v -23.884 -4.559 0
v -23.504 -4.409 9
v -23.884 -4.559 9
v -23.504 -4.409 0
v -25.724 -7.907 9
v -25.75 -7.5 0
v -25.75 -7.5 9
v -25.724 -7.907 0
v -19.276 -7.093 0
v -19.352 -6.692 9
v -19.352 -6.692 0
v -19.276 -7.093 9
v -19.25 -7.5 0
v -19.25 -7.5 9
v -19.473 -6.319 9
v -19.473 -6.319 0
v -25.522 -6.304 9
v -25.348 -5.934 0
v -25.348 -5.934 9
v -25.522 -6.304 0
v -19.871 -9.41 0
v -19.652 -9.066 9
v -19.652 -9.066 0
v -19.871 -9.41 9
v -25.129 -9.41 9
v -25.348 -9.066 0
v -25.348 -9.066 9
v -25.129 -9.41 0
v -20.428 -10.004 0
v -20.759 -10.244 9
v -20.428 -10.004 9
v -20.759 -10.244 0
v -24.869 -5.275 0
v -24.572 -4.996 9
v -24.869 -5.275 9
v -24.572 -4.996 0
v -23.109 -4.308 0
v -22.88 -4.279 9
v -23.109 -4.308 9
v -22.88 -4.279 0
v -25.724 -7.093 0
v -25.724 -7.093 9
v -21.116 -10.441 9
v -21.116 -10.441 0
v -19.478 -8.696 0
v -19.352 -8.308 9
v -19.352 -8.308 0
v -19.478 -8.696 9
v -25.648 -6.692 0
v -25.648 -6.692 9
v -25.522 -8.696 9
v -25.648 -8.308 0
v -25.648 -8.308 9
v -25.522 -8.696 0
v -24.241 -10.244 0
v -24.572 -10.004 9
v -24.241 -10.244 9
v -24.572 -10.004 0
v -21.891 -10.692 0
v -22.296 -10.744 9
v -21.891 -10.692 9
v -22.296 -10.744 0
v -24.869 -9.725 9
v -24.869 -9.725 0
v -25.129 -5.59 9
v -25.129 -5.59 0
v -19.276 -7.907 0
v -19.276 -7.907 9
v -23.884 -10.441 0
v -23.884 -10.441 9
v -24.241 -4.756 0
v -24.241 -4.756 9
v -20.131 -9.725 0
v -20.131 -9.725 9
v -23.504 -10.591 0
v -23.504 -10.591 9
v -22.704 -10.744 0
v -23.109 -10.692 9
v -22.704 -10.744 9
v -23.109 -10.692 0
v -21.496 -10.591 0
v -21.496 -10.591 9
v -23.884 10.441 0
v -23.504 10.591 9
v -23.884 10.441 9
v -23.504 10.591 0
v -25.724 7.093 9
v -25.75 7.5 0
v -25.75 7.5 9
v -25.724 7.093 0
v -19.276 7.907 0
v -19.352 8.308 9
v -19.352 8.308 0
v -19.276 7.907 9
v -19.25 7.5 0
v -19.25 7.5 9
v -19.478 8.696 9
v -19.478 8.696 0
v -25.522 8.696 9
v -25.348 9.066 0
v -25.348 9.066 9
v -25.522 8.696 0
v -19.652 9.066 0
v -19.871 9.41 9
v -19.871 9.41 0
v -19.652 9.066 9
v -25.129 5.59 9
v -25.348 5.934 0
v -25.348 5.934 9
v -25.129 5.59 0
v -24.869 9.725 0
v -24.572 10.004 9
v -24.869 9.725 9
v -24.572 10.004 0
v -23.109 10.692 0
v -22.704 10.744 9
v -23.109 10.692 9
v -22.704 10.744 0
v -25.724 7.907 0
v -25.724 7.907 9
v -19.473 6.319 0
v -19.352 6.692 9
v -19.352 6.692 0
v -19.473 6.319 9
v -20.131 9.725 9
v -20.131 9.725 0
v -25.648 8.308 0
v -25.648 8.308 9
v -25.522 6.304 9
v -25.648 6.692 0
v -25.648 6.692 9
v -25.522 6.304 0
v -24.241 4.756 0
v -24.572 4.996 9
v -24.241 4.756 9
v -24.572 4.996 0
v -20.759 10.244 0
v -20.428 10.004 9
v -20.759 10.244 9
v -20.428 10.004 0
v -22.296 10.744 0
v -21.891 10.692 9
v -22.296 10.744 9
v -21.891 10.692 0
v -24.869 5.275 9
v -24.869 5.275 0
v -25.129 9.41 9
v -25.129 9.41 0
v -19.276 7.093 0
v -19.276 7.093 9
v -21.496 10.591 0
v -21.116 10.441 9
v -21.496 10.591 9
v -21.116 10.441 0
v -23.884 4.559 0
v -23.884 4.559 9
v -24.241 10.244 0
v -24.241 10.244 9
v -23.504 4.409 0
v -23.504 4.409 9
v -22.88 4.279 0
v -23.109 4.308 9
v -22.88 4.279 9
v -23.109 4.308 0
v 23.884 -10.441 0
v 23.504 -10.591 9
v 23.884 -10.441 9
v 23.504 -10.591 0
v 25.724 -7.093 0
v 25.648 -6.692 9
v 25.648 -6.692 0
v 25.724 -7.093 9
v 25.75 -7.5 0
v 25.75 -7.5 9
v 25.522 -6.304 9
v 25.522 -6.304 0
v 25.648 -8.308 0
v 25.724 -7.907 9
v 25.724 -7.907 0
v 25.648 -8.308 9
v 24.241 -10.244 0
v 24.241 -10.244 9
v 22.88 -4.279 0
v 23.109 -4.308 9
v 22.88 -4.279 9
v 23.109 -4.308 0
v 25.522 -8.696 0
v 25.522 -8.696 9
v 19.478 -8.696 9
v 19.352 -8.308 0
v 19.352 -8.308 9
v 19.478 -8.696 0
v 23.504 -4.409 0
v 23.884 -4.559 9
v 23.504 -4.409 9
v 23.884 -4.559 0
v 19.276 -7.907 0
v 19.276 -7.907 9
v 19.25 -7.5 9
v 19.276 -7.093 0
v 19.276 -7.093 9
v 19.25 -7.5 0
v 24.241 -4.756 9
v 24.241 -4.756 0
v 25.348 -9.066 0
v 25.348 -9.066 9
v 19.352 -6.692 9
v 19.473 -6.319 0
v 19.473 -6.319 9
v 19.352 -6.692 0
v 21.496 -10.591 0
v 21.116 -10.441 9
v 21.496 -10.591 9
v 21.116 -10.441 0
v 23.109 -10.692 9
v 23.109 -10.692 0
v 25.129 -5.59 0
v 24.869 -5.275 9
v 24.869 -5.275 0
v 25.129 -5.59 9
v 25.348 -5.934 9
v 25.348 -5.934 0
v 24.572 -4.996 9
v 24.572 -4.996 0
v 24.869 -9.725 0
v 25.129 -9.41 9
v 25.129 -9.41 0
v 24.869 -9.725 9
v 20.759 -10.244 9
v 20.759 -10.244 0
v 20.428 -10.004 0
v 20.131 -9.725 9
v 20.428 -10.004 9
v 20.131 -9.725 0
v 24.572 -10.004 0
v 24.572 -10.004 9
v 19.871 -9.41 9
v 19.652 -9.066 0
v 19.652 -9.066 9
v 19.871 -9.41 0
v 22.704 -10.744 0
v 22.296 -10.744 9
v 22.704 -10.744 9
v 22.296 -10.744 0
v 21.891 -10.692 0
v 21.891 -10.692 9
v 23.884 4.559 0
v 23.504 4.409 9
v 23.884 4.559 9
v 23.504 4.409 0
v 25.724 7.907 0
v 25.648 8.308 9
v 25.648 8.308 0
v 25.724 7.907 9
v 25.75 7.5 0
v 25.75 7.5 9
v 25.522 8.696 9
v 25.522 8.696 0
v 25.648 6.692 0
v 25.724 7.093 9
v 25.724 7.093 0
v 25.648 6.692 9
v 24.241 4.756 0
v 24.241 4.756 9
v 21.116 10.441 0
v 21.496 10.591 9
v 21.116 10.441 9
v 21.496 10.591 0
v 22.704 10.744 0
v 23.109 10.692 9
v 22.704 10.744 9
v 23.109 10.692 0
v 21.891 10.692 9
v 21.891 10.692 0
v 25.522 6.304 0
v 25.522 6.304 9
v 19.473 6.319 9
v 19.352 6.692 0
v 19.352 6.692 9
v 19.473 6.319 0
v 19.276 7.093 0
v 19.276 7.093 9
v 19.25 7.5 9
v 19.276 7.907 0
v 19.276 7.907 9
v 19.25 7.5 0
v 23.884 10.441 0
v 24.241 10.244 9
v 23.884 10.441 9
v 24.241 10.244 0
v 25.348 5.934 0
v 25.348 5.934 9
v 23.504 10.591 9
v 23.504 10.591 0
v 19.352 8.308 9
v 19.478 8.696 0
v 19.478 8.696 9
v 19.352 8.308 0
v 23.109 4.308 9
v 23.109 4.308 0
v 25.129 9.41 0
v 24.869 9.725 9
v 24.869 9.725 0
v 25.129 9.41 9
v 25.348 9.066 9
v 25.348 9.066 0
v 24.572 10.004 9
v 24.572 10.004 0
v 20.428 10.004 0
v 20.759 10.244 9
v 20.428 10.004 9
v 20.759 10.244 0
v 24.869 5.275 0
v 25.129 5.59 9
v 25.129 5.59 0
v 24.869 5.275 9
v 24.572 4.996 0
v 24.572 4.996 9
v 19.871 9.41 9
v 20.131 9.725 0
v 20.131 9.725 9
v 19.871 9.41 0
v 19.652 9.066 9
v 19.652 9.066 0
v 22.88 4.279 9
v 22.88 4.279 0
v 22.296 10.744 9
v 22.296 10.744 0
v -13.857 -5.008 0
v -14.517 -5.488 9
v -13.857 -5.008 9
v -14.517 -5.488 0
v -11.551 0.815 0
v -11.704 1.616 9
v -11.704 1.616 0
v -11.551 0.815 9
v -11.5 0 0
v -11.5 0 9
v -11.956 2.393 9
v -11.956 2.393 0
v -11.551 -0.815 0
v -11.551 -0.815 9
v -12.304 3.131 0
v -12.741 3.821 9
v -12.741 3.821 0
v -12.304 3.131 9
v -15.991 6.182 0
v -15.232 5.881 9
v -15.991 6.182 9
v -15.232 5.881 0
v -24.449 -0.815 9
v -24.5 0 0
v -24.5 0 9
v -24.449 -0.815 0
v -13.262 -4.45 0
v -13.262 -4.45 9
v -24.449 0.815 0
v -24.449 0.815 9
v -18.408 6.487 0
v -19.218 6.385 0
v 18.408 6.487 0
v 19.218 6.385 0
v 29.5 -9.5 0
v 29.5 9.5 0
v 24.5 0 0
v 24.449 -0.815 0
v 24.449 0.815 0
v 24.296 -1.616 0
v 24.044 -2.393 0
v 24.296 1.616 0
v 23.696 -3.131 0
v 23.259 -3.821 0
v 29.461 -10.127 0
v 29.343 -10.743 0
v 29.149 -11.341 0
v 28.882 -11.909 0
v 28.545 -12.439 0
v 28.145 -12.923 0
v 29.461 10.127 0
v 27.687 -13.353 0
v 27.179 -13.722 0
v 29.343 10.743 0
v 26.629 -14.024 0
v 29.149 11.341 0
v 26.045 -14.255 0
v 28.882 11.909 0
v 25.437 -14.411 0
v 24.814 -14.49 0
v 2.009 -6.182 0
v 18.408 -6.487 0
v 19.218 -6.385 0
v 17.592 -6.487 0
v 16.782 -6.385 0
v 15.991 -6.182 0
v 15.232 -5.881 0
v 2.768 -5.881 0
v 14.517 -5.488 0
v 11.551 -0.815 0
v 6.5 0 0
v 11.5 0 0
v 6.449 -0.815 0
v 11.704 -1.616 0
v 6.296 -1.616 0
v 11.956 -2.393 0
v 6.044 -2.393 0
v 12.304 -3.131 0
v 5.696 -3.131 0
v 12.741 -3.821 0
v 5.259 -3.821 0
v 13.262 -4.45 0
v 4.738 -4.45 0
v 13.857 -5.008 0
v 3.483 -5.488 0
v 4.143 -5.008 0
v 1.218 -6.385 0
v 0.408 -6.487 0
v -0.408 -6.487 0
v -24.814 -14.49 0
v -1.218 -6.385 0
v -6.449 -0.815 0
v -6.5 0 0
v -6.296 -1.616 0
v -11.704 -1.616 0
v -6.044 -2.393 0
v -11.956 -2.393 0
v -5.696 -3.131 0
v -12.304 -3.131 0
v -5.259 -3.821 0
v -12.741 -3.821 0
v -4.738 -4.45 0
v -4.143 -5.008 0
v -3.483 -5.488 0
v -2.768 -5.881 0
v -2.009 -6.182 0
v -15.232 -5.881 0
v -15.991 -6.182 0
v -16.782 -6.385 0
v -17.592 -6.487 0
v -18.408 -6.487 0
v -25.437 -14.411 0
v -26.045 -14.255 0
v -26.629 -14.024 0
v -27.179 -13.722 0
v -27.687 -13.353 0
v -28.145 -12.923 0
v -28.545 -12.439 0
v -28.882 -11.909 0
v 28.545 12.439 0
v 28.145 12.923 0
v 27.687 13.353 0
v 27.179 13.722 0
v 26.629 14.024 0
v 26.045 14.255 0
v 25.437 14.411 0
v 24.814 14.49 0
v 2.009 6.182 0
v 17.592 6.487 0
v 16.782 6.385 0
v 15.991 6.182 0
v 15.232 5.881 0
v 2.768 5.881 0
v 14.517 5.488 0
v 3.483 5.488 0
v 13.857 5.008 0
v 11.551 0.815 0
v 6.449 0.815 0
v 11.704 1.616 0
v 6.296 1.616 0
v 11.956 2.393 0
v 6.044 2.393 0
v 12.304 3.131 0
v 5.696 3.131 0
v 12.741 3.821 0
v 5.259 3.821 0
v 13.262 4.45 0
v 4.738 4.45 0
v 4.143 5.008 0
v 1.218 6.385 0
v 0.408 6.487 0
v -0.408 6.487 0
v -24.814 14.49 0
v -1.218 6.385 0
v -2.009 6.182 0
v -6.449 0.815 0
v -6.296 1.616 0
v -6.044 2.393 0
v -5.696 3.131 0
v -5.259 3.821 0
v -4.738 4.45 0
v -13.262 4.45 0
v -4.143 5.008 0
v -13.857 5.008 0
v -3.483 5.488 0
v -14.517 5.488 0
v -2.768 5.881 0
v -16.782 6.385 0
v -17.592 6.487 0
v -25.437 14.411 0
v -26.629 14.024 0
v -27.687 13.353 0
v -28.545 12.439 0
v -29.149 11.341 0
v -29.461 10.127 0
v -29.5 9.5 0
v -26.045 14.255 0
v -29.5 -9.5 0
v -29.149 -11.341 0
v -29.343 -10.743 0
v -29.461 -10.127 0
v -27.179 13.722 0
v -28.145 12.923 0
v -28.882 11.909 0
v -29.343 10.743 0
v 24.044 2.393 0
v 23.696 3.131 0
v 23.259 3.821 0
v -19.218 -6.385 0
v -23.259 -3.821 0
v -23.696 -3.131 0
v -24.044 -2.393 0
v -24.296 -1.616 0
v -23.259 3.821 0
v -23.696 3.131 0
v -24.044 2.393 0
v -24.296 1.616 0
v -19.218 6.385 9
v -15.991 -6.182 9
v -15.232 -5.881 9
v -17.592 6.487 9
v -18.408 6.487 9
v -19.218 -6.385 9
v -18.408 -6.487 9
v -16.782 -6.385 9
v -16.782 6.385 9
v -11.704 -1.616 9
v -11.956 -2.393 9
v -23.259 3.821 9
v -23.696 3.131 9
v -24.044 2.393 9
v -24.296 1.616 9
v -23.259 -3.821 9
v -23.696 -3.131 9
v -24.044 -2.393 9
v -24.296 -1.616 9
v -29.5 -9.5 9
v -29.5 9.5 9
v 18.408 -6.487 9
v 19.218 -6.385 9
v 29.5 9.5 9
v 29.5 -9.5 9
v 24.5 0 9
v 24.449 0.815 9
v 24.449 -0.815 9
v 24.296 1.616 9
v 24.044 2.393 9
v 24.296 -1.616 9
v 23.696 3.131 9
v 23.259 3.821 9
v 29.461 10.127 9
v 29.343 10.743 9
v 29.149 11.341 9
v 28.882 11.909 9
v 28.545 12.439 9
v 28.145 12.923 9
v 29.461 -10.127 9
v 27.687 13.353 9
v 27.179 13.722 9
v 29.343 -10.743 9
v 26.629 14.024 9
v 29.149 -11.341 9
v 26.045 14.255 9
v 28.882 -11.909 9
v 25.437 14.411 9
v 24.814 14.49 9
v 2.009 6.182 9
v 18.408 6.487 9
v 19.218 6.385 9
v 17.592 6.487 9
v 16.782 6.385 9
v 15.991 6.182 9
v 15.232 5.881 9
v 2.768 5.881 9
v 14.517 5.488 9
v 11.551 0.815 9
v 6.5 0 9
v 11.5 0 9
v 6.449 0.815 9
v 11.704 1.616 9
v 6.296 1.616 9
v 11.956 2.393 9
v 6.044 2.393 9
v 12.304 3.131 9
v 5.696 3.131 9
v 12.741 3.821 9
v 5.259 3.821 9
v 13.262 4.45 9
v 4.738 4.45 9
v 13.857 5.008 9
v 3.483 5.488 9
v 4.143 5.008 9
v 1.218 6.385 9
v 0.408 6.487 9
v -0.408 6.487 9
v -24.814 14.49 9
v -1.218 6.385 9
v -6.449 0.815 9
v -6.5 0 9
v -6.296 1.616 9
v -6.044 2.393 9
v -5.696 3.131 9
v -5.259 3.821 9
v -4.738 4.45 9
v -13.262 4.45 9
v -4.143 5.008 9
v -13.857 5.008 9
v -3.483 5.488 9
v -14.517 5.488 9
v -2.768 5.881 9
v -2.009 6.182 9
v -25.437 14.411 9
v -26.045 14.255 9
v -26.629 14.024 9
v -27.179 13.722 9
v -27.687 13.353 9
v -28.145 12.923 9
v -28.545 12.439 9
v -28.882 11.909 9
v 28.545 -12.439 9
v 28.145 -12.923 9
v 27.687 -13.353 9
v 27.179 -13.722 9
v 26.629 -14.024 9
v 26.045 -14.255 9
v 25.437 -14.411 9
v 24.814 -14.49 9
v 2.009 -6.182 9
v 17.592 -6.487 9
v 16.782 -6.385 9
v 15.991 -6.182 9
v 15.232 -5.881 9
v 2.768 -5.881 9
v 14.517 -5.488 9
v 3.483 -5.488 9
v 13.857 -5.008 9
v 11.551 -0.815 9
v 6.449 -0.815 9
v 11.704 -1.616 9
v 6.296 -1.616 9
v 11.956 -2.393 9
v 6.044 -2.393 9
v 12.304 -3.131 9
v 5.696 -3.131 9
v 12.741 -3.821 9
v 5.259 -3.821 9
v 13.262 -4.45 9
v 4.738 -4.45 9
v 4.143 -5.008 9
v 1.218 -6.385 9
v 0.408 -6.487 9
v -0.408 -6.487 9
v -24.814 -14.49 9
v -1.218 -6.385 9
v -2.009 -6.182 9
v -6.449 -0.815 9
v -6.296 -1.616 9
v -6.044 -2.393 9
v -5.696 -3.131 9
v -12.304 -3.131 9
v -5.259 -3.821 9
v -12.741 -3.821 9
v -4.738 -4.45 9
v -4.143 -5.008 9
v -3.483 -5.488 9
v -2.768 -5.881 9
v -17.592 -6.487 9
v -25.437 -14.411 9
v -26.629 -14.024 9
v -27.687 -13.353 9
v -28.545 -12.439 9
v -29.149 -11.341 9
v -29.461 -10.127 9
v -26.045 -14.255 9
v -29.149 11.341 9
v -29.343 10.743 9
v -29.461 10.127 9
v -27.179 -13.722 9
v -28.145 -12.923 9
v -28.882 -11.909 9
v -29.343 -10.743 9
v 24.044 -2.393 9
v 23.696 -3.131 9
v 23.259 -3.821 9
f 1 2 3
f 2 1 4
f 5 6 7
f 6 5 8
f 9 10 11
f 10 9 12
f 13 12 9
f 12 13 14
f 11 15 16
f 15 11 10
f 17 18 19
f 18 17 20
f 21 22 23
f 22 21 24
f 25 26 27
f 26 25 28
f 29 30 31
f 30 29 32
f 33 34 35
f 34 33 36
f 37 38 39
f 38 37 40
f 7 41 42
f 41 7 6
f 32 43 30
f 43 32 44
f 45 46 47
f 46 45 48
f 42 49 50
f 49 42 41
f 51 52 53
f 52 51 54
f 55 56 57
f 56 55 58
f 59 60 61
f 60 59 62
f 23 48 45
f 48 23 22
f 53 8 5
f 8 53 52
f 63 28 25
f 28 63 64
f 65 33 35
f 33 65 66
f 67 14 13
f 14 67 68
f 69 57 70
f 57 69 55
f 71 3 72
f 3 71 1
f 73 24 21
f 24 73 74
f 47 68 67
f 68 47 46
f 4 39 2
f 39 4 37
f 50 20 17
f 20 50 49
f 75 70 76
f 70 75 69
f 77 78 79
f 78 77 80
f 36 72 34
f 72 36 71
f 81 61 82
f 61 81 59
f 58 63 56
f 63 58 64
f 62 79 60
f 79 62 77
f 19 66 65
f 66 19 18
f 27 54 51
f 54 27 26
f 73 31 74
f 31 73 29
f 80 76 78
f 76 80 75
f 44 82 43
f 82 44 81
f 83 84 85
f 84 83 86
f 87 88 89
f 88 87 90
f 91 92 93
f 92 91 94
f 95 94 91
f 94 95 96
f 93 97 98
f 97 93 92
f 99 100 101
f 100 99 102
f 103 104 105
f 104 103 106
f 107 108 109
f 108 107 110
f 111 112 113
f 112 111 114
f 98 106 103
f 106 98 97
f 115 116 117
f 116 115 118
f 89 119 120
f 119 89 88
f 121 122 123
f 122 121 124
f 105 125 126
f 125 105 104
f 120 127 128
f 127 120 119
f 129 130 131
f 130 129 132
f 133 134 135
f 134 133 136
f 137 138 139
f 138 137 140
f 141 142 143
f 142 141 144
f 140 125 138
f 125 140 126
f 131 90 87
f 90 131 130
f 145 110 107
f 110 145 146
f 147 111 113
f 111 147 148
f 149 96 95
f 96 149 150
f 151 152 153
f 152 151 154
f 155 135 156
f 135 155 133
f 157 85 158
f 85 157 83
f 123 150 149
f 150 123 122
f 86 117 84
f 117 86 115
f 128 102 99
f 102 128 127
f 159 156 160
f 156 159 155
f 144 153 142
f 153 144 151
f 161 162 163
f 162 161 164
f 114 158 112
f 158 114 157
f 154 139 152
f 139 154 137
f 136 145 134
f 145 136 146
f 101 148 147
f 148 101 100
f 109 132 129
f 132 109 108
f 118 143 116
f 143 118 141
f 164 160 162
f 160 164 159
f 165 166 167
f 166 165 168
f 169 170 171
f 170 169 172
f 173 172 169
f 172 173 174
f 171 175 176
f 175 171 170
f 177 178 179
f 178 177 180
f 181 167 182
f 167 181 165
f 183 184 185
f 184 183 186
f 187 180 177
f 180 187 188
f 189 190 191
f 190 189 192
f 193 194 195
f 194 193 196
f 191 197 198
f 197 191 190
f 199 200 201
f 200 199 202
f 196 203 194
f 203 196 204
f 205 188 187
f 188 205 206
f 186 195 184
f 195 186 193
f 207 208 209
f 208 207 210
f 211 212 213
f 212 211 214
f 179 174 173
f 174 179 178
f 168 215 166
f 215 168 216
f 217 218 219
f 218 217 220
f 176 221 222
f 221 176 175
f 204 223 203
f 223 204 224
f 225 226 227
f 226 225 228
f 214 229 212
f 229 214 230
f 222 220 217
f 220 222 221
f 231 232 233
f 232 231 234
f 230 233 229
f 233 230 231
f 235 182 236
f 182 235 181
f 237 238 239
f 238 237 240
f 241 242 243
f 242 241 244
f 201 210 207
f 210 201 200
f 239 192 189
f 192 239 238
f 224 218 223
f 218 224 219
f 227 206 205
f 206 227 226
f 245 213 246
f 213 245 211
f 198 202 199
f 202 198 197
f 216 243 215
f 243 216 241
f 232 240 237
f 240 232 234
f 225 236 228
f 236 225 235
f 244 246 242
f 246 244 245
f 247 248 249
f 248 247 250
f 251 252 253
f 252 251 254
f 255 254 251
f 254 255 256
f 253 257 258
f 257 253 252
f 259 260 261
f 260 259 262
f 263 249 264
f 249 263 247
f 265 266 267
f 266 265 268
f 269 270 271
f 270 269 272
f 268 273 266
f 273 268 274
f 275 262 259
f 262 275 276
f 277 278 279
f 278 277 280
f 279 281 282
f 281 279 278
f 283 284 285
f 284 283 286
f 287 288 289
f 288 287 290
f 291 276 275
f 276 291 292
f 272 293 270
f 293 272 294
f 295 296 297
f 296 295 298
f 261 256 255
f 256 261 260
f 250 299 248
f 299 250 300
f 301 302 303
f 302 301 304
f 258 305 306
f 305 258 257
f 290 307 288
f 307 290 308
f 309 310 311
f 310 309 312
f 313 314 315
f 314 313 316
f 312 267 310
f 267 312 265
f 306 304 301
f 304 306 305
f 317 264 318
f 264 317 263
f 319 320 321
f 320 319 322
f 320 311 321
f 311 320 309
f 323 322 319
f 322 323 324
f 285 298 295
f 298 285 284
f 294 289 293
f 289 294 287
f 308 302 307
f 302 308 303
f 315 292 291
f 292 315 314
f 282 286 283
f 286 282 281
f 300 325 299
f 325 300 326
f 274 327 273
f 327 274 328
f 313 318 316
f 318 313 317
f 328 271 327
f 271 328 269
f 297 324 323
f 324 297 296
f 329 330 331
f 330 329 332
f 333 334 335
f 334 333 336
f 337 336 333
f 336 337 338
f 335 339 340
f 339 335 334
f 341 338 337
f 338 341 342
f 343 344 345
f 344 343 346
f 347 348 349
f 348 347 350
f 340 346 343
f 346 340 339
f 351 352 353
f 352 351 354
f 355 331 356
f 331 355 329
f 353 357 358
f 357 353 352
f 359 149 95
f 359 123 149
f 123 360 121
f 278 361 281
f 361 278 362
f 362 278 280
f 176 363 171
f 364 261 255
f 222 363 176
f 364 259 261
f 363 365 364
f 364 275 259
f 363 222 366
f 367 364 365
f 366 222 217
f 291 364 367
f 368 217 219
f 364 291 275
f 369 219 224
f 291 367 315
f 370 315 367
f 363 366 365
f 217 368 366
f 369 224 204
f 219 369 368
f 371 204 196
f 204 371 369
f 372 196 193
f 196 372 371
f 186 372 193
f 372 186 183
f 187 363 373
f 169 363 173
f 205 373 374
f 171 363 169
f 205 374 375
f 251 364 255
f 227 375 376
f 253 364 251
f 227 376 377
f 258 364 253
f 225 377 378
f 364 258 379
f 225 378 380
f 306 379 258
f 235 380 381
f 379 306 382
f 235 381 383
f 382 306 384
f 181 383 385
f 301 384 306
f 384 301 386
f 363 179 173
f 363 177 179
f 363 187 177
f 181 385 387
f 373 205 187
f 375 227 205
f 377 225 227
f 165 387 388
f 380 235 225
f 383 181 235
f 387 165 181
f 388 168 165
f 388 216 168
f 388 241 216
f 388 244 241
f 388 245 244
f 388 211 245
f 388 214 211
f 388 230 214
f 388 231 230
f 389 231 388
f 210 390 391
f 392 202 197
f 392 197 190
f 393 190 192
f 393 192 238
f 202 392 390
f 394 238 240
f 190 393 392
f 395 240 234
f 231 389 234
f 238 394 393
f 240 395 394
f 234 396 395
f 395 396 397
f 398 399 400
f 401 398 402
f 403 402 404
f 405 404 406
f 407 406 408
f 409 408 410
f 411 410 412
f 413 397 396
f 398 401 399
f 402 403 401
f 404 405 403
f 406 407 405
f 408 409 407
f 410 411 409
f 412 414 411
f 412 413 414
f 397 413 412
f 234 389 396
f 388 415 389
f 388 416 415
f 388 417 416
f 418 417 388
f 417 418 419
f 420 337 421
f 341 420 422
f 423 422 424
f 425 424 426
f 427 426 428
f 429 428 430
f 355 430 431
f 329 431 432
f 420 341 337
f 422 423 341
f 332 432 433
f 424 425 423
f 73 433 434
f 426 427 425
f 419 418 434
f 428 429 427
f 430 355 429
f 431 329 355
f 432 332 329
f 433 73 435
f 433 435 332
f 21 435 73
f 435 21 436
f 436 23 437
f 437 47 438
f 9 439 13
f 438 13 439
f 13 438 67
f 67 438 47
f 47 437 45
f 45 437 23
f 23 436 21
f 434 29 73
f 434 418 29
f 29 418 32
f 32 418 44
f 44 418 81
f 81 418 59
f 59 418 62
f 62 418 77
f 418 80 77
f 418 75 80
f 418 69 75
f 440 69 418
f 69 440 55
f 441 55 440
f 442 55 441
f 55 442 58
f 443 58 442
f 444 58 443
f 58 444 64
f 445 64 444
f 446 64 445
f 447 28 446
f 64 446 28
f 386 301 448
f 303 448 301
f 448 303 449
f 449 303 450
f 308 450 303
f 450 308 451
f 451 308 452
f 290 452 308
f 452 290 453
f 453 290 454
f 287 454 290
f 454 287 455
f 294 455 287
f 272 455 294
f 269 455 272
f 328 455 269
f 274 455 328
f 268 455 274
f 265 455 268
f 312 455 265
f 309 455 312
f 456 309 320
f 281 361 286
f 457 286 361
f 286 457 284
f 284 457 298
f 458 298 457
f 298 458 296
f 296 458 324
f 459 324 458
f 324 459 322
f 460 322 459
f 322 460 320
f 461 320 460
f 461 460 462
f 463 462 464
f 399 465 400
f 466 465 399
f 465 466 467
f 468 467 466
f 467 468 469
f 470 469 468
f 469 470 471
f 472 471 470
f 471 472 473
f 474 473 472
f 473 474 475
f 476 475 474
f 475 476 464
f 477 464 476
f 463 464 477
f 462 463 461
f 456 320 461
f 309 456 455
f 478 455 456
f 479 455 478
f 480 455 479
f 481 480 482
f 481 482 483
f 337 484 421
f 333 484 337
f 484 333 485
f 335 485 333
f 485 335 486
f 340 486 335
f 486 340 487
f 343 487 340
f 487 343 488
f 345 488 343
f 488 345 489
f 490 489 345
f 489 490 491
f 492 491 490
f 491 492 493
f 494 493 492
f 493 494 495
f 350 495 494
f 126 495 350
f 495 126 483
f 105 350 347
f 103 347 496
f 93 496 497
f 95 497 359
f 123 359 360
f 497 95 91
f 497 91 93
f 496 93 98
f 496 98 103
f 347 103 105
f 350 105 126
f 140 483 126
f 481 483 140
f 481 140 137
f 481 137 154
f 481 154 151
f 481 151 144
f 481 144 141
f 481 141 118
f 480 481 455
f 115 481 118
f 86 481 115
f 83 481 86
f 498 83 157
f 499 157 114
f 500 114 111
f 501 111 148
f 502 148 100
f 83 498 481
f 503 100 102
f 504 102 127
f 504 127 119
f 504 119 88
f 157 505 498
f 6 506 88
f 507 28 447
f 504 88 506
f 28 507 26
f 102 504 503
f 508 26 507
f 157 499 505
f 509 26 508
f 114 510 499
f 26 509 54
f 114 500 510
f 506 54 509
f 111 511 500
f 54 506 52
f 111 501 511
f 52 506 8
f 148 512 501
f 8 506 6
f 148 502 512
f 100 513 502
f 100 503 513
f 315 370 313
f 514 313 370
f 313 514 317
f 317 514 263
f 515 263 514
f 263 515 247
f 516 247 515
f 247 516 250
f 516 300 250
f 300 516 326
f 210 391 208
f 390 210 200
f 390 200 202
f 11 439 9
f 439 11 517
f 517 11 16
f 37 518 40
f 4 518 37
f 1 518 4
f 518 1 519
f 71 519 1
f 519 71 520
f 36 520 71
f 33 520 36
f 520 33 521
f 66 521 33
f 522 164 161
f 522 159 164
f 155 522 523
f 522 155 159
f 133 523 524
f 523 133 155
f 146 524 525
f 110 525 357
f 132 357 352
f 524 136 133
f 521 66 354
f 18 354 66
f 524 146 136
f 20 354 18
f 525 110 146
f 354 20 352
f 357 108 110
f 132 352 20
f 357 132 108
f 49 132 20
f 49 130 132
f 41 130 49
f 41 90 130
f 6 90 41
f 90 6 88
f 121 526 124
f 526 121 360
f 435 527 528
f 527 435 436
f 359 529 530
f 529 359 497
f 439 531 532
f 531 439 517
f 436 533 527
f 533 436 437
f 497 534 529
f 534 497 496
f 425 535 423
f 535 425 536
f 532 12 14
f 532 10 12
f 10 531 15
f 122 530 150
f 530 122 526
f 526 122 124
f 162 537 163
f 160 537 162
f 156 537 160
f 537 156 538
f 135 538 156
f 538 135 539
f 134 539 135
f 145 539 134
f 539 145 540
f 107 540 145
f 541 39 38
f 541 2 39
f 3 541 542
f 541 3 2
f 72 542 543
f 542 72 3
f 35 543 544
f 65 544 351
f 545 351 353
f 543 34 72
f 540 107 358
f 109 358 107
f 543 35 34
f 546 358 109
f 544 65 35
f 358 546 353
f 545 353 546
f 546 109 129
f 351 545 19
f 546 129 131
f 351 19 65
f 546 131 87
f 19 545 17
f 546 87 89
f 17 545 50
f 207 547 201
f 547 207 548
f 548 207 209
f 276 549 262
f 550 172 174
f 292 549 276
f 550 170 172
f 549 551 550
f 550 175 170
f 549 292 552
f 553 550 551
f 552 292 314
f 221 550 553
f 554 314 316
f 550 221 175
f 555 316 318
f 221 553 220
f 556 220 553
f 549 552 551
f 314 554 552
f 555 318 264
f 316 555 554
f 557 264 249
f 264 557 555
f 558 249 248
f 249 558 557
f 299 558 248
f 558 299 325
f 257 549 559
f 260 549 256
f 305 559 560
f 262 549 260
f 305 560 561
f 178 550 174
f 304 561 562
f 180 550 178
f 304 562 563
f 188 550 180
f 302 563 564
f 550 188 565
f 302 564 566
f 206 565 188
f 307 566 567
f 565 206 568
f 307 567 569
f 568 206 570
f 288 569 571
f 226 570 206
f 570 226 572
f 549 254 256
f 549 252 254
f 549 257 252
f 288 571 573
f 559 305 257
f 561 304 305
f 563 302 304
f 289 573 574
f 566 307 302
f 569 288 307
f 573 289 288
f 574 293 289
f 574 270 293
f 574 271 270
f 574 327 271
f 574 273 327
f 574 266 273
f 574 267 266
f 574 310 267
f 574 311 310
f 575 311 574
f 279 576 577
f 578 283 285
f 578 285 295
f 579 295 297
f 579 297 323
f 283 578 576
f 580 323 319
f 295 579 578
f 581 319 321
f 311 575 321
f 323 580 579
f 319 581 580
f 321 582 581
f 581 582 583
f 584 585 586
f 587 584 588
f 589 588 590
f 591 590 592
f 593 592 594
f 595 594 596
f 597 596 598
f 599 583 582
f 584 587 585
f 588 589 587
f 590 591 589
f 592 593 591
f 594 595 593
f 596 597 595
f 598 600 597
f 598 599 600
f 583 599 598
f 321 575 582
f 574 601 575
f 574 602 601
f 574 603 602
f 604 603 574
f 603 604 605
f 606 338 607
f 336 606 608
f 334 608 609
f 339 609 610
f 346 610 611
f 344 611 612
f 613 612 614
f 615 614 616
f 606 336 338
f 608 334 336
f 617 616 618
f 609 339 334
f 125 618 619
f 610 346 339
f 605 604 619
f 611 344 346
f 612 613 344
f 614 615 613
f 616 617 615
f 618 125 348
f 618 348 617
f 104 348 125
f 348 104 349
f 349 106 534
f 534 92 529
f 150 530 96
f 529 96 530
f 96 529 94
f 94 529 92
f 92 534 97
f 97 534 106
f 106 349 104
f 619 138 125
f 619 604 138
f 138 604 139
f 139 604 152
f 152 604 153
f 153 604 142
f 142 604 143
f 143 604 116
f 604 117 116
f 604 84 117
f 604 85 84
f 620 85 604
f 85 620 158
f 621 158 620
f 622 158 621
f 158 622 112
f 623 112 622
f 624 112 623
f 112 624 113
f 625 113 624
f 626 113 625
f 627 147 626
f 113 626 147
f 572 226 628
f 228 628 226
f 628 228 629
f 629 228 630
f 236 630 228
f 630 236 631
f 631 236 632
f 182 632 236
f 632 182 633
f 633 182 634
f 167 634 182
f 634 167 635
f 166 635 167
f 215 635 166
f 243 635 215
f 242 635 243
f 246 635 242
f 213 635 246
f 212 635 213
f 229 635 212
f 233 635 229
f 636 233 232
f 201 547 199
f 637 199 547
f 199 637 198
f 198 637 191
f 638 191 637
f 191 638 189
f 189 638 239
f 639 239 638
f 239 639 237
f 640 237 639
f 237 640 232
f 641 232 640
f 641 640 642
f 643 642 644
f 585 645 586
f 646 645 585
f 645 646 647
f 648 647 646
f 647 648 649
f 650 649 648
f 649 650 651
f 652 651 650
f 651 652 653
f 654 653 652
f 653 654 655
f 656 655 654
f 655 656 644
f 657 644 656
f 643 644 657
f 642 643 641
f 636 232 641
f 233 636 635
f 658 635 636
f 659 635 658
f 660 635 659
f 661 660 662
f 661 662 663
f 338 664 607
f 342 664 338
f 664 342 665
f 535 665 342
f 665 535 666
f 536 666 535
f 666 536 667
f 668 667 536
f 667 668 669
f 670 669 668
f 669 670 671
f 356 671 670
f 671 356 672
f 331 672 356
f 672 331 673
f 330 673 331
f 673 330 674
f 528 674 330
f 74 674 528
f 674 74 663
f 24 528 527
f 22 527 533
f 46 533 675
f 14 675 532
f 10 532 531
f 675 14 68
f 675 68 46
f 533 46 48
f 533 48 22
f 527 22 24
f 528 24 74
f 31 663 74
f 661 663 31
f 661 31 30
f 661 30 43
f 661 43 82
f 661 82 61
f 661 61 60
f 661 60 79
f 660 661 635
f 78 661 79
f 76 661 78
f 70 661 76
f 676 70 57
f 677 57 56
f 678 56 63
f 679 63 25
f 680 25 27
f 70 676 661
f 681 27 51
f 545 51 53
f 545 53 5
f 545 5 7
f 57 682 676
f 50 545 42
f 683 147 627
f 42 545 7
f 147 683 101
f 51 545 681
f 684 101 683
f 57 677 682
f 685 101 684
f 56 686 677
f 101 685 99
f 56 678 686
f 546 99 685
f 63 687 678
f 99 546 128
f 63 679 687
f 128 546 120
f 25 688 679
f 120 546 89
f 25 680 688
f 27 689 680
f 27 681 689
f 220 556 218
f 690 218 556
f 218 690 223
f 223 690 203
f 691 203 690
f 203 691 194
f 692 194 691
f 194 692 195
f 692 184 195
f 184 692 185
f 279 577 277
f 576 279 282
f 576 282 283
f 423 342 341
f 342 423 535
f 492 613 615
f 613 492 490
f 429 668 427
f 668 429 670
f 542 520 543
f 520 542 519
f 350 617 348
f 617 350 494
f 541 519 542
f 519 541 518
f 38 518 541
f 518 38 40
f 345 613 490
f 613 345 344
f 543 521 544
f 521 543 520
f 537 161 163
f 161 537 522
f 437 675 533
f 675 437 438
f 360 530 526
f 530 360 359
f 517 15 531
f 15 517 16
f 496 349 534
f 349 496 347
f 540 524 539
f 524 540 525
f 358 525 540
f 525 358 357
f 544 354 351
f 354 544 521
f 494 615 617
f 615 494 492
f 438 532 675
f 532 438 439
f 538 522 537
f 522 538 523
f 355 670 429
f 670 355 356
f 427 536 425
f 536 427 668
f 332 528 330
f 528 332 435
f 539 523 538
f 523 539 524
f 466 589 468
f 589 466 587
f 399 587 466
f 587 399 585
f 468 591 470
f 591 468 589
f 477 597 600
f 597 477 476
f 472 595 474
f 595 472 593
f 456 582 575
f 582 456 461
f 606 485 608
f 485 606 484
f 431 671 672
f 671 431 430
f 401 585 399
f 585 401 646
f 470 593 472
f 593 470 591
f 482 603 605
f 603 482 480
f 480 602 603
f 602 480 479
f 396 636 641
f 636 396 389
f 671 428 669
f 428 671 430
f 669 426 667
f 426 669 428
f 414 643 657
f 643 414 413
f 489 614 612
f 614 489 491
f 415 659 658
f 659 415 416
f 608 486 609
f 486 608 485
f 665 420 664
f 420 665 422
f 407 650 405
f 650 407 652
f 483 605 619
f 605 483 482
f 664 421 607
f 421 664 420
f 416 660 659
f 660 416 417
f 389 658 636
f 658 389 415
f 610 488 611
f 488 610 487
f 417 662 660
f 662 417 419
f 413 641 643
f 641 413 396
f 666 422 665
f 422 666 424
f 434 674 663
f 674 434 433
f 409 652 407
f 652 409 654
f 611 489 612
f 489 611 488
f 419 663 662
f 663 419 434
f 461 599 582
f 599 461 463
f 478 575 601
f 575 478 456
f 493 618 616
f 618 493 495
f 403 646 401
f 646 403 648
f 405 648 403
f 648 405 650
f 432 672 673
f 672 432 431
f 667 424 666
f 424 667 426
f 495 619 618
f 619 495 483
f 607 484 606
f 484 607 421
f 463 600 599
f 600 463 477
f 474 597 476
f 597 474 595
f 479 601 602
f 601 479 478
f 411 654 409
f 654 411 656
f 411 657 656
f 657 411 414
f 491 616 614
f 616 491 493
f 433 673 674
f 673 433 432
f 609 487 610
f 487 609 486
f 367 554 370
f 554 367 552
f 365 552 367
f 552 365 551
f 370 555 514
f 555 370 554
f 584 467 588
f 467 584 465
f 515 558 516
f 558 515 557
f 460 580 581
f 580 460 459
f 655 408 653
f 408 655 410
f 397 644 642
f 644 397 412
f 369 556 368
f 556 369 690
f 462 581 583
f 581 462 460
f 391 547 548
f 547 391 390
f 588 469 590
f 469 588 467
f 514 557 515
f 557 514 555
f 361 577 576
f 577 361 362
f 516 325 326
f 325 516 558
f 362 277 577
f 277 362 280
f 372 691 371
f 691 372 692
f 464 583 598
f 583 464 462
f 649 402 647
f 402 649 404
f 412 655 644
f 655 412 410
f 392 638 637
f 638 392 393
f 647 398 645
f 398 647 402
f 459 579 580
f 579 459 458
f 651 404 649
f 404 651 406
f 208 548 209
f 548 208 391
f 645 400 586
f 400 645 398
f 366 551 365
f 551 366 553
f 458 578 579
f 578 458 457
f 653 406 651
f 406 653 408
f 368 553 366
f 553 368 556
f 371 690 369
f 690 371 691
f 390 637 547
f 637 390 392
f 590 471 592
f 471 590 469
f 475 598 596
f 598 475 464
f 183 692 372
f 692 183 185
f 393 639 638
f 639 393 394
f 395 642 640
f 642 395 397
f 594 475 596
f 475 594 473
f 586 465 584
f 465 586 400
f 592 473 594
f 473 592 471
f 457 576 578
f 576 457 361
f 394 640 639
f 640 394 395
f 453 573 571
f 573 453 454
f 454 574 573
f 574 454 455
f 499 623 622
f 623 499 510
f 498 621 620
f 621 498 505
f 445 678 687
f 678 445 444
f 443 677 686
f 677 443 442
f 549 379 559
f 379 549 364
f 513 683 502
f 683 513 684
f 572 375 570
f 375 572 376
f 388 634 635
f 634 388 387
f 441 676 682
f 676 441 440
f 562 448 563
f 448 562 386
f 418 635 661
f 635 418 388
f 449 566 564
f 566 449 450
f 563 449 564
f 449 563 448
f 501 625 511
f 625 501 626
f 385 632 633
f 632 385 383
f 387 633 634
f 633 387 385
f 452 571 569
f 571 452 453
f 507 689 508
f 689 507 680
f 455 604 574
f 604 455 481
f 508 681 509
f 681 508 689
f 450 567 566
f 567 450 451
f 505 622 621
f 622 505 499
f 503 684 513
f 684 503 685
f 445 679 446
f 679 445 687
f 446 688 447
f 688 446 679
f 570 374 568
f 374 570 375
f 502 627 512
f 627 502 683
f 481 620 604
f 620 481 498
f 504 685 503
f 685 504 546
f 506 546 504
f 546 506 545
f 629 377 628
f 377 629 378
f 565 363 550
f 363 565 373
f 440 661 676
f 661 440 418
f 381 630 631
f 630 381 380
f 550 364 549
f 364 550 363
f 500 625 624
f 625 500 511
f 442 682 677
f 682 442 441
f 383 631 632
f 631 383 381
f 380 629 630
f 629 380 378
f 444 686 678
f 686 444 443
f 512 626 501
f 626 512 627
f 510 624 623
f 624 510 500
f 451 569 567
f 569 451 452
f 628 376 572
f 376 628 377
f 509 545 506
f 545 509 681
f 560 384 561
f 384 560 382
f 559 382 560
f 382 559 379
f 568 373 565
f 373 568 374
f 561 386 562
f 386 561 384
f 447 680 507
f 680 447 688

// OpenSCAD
$fn = 50;


difference() {
	union() {
		hull() {
			translate(v = [-24.5000000000, 9.5000000000, 0]) {
				cylinder(h = 9, r = 5);
			}
			translate(v = [24.5000000000, 9.5000000000, 0]) {
				cylinder(h = 9, r = 5);
			}
			translate(v = [-24.5000000000, -9.5000000000, 0]) {
				cylinder(h = 9, r = 5);
			}
			translate(v = [24.5000000000, -9.5000000000, 0]) {
				cylinder(h = 9, r = 5);
			}
		}
	}
	union() {
		#translate(v = [-22.5000000000, -7.5000000000, -100.0000000000]) {
			cylinder(h = 200, r = 3.2500000000);
		}
		#translate(v = [-22.5000000000, 7.5000000000, -100.0000000000]) {
			cylinder(h = 200, r = 3.2500000000);
		}
		#translate(v = [22.5000000000, -7.5000000000, -100.0000000000]) {
			cylinder(h = 200, r = 3.2500000000);
		}
		#translate(v = [22.5000000000, 7.5000000000, -100.0000000000]) {
			cylinder(h = 200, r = 3.2500000000);
		}
		#translate(v = [-18.0000000000, 0, 0]) {
			cylinder(h = 9, r = 6.5000000000);
		}
		#cylinder(h = 9, r = 6.5000000000);
		#translate(v = [18.0000000000, 0, 0]) {
			cylinder(h = 9, r = 6.5000000000);
		}
	}
}
